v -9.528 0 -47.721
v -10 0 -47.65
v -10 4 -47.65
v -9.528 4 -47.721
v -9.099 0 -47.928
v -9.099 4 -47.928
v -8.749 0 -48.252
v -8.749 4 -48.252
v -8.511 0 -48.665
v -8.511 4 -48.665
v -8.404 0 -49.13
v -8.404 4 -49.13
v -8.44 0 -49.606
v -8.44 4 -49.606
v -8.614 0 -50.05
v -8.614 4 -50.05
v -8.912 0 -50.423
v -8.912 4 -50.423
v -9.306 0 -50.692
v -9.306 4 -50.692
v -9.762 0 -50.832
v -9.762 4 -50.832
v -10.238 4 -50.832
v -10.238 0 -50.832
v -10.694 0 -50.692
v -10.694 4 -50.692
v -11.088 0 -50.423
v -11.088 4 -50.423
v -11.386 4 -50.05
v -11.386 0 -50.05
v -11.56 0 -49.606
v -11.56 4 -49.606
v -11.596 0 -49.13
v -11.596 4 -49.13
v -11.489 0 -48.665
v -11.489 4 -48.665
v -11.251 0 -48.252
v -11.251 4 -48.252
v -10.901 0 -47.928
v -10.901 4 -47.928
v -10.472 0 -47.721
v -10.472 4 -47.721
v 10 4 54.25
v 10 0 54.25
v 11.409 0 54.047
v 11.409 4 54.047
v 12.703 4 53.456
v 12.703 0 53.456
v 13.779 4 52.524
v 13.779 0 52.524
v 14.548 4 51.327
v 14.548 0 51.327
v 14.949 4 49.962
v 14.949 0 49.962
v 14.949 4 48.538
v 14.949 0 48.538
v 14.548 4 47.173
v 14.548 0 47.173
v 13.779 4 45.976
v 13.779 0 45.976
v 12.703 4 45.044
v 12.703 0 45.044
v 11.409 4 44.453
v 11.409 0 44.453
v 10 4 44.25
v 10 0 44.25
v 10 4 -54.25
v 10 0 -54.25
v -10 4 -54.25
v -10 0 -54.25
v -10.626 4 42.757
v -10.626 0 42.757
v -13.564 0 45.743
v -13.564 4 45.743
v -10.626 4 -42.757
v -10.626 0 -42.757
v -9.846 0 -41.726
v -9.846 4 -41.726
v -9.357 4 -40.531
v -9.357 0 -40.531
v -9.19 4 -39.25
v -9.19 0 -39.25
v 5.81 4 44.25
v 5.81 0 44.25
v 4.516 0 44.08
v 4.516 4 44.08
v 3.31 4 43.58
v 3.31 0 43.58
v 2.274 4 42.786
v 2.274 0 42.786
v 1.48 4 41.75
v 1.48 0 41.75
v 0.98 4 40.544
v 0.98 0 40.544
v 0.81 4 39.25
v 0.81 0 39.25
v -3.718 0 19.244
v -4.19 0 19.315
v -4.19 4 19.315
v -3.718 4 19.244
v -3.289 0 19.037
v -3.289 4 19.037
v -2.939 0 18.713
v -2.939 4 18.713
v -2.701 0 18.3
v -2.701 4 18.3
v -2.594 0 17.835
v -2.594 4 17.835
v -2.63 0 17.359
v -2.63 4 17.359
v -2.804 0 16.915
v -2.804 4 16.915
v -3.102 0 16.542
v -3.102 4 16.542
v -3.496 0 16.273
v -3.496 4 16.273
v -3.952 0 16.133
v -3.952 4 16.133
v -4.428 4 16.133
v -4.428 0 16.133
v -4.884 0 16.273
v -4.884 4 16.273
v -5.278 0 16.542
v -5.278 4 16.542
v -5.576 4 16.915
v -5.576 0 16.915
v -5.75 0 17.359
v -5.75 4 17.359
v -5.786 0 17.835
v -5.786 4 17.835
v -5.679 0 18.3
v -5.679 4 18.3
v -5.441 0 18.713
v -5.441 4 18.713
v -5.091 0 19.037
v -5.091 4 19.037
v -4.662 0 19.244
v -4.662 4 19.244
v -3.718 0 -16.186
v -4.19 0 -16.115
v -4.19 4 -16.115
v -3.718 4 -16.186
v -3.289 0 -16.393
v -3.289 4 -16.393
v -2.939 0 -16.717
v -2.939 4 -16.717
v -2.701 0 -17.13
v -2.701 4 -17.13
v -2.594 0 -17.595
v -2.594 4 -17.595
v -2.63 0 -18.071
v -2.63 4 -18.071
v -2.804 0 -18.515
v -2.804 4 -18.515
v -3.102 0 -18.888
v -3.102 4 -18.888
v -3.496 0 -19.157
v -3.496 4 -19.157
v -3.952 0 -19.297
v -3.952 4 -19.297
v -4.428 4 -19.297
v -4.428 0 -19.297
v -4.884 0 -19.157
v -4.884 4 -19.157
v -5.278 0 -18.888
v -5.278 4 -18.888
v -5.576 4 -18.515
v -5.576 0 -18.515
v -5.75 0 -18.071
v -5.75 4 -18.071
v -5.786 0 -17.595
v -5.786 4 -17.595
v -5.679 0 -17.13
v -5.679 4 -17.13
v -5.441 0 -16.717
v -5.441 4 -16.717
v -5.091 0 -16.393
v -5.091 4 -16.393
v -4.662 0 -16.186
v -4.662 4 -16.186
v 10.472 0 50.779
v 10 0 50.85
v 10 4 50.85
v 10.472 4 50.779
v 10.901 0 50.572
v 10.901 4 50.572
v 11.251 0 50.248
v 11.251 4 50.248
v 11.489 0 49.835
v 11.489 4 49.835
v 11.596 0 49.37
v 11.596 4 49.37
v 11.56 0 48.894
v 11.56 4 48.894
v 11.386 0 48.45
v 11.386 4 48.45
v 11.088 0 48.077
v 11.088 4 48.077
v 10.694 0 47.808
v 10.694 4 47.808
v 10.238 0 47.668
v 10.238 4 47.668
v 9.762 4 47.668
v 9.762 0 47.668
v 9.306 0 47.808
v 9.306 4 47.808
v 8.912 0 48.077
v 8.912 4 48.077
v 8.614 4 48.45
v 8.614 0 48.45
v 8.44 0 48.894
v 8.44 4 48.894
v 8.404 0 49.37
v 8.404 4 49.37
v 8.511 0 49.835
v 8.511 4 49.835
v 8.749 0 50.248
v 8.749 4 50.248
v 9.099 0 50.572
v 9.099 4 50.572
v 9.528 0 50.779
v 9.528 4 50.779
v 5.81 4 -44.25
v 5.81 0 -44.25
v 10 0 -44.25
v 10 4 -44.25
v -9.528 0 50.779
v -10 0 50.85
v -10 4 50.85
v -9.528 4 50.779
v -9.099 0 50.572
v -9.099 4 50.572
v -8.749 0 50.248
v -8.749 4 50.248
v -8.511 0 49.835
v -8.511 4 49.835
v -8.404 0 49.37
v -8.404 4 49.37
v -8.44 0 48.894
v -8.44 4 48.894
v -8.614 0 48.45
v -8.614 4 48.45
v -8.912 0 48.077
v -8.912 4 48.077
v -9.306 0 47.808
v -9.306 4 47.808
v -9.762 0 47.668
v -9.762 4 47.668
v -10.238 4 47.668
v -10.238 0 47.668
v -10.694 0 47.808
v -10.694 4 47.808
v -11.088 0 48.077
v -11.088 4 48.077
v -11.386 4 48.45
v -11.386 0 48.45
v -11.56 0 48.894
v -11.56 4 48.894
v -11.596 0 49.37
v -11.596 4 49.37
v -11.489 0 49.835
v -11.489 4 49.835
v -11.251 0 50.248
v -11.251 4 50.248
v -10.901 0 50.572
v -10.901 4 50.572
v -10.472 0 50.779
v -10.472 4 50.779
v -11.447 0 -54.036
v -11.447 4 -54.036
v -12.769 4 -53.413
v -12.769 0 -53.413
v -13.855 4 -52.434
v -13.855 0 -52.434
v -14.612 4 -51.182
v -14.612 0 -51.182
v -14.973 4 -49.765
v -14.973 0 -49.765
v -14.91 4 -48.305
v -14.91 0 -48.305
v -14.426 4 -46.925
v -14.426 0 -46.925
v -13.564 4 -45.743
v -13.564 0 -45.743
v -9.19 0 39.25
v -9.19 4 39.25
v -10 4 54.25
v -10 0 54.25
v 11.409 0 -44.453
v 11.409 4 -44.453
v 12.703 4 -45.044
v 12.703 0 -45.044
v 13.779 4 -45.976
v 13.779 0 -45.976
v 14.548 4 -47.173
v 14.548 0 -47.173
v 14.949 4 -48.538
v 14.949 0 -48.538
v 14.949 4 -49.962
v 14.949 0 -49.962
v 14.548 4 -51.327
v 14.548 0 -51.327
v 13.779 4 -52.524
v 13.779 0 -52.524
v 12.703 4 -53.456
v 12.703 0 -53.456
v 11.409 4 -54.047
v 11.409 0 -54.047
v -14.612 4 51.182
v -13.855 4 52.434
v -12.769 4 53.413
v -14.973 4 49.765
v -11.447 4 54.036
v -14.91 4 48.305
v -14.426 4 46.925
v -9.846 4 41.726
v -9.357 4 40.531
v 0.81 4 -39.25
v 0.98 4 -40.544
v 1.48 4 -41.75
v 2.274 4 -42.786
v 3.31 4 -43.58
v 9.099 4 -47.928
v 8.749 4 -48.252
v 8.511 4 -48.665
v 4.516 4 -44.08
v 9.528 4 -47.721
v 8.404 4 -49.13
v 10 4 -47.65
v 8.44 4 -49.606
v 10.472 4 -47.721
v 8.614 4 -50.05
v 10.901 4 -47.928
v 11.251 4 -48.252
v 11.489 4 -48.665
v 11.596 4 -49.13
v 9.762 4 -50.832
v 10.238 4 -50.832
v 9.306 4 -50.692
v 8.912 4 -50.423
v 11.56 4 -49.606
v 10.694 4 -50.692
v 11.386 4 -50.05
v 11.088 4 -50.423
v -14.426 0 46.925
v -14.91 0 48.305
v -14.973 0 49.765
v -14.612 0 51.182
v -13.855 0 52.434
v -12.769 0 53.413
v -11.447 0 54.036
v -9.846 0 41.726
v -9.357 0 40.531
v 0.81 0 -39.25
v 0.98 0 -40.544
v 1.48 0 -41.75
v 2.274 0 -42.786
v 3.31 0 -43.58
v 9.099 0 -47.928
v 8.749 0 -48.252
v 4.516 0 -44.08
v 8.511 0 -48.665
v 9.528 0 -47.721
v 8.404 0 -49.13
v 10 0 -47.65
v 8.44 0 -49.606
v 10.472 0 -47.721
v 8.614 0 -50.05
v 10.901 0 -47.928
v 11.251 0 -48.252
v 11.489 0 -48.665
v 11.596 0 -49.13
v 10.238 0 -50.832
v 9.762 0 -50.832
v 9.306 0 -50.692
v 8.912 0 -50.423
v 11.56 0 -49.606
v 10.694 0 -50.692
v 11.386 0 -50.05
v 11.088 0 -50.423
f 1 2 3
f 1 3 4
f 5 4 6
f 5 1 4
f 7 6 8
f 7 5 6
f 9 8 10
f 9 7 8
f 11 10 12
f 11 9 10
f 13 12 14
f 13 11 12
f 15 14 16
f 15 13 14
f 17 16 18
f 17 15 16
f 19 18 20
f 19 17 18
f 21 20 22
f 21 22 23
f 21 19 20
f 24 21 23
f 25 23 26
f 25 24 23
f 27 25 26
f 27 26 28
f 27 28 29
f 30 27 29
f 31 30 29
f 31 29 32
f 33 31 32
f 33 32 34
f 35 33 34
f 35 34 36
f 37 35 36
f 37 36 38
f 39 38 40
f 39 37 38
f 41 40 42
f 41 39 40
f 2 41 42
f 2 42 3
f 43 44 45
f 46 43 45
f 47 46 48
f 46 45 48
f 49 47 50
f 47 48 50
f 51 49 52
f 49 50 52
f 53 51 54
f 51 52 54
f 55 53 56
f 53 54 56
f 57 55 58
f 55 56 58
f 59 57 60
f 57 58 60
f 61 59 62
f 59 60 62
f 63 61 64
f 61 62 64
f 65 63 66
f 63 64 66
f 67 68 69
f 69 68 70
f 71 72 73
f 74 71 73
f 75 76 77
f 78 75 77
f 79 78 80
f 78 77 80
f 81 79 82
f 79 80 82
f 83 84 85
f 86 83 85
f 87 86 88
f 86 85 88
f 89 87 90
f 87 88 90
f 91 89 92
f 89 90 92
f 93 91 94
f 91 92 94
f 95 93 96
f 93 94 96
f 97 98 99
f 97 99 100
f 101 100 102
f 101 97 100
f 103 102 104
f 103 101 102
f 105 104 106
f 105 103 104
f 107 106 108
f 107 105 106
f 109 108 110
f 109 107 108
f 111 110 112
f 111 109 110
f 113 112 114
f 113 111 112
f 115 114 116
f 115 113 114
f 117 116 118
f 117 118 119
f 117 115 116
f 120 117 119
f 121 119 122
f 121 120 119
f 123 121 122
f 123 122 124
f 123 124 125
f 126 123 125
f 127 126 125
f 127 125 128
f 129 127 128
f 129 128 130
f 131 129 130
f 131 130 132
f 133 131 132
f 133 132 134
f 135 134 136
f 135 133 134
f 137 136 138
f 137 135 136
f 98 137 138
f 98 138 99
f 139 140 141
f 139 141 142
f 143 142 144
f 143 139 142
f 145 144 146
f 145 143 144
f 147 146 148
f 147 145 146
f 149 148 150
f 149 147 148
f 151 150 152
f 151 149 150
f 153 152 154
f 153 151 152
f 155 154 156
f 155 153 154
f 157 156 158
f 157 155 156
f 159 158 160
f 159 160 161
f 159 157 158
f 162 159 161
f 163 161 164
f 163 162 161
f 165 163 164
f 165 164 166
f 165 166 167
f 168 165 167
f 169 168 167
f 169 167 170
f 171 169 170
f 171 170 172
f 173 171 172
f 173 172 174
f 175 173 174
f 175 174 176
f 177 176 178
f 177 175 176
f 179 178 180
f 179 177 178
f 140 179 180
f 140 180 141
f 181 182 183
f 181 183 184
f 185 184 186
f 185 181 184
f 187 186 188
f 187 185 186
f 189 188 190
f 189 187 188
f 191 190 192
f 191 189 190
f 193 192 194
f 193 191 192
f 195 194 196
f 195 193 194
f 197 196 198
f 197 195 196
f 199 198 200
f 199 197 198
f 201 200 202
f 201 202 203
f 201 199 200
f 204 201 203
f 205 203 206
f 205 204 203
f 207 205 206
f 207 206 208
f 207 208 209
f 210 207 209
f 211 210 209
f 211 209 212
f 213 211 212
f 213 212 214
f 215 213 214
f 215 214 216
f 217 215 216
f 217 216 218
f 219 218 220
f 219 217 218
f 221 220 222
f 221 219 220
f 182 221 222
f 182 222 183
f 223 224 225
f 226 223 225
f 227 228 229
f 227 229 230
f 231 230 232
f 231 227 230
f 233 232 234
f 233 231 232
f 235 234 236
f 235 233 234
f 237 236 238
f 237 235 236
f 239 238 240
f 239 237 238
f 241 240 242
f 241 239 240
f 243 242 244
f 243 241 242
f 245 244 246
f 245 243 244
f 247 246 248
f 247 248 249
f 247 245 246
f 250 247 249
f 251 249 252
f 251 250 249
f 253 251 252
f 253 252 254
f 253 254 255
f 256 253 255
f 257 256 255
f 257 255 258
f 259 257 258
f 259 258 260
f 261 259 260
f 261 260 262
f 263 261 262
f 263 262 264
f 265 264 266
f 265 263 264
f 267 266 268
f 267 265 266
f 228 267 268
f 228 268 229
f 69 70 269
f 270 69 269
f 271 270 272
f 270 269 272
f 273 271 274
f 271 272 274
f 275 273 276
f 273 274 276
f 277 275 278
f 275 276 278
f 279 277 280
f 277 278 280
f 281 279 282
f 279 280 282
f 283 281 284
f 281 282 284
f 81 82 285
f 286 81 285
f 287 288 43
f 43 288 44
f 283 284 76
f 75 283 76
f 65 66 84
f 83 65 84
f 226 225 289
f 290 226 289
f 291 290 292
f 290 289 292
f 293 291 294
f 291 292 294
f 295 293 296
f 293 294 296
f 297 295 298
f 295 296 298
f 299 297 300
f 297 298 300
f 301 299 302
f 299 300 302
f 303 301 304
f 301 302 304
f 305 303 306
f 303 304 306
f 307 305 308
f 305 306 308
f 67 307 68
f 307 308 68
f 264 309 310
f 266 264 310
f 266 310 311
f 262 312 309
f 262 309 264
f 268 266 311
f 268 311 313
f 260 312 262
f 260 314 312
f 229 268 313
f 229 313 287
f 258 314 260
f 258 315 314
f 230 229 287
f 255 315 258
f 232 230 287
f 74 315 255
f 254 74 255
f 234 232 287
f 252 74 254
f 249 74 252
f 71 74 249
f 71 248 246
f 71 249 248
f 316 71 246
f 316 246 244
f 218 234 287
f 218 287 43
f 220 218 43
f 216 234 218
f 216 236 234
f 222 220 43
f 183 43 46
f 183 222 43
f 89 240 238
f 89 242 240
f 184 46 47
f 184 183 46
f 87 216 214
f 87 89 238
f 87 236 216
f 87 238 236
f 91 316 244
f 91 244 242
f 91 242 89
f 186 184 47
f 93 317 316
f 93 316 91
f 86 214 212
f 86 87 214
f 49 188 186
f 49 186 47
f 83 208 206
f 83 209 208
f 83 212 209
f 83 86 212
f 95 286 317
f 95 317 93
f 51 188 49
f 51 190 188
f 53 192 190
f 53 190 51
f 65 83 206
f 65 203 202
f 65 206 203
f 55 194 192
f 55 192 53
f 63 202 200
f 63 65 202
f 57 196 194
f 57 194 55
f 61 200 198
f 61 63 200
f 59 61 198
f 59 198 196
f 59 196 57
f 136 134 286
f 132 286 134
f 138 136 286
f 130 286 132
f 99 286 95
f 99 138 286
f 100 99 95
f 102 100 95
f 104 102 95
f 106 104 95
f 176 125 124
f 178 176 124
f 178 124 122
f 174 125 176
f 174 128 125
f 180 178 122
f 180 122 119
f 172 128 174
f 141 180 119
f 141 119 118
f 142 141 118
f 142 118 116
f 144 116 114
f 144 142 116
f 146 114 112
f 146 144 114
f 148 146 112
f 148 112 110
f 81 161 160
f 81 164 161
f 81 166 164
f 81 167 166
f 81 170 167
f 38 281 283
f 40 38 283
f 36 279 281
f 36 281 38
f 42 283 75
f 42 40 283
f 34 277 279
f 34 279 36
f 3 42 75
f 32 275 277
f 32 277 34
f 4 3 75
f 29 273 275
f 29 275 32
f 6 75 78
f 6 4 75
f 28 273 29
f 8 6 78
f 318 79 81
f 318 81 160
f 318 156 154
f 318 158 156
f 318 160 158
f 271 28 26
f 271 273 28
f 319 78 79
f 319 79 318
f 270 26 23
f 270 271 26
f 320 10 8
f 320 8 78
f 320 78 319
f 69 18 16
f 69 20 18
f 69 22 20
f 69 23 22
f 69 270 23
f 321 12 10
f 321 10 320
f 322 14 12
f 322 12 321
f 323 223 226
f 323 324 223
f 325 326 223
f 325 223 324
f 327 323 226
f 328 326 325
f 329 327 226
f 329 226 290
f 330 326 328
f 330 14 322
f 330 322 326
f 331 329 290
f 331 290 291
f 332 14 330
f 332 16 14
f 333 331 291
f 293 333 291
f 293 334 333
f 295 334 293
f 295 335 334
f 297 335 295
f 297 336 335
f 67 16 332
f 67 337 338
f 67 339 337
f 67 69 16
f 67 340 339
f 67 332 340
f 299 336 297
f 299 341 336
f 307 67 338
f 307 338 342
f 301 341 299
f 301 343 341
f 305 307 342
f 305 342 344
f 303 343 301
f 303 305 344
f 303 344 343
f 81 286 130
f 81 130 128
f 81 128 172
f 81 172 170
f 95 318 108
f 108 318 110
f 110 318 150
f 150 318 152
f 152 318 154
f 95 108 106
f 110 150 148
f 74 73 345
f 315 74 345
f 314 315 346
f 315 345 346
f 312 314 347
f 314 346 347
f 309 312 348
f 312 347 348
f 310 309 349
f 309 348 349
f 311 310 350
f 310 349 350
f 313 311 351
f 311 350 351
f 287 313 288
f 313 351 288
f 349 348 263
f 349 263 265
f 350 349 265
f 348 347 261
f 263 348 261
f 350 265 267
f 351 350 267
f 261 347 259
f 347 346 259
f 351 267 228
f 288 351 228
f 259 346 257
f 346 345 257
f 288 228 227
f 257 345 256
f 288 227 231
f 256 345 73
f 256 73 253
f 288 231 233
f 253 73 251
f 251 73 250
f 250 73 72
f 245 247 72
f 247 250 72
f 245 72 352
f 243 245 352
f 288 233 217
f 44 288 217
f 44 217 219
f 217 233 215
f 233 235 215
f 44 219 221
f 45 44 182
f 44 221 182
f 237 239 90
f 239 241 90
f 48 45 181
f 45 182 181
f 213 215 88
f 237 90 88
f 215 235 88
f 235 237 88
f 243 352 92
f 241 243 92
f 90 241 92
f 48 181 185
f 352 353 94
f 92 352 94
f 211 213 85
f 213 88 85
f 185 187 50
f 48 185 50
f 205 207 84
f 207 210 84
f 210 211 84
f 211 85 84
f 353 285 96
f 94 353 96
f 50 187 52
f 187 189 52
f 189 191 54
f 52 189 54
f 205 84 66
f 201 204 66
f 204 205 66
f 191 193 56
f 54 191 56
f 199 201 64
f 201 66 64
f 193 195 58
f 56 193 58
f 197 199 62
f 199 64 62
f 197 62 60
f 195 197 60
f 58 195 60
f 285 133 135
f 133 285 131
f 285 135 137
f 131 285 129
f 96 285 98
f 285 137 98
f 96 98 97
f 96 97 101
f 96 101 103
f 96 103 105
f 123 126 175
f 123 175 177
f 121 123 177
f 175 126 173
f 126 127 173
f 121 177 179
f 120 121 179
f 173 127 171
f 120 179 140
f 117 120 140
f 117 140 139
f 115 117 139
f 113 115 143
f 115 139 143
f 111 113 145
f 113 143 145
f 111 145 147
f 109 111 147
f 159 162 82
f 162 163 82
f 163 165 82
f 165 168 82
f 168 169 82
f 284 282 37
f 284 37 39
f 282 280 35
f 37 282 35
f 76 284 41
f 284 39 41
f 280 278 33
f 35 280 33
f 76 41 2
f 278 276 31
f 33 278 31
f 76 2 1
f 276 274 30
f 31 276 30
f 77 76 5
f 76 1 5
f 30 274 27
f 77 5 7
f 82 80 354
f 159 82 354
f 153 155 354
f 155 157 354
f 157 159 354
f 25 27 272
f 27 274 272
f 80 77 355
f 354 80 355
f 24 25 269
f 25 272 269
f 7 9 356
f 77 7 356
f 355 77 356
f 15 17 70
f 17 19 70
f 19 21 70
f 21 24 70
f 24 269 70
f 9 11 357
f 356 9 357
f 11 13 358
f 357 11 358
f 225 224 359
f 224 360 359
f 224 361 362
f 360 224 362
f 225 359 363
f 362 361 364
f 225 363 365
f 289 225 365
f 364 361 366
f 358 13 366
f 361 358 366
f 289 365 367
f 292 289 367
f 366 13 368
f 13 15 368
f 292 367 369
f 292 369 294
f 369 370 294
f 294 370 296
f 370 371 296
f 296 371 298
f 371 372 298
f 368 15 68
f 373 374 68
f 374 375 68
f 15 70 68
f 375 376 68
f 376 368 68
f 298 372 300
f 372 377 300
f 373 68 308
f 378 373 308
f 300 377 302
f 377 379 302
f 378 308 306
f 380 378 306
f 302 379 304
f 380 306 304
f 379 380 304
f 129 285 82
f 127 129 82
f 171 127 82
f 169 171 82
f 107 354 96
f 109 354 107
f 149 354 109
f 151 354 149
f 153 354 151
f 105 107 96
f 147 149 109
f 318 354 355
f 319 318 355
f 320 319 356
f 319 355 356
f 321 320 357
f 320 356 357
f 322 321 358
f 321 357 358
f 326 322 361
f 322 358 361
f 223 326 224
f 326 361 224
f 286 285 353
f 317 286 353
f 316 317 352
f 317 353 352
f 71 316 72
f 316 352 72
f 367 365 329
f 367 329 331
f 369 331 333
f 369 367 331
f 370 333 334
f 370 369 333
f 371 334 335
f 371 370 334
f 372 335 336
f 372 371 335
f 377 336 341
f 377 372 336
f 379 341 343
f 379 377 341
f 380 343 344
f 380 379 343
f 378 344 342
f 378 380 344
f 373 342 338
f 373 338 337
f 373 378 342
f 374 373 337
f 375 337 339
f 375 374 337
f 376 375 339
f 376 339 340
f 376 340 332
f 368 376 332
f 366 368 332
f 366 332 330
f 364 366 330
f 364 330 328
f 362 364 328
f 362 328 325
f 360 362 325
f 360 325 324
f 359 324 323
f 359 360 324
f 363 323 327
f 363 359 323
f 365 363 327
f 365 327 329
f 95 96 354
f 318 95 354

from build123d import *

# Parameters (mm, degrees)
SKETCH1_R           = 1.6
BOSS_EXTRUDE1_DEPTH = 4


with BuildPart() as part:
    # Sketch1 → Boss-Extrude1 (new body)
    with BuildSketch(Plane(origin=(0, 0, 0), x_dir=(1, 0, 0), z_dir=(0, 1, 0))):
        with BuildLine():
            Line((10, 54.25), (-10, 54.25))
            ThreePointArc((-10, 54.25), (-14.611555285, 51.182241665), (-13.564255704, 45.74342314))
            Line((-13.564255704, 45.74342314), (-10.625744296, 42.75657686))
            ThreePointArc((-10.625744296, 42.75657686), (-9.562836802, 41.14456083), (-9.19, 39.25))
            Line((-9.19, 39.25), (-9.19, -39.25))
            ThreePointArc((-9.19, -39.25), (-9.562836802, -41.14456083), (-10.625744296, -42.75657686))
            Line((-10.625744296, -42.75657686), (-13.564255704, -45.74342314))
            ThreePointArc((-13.564255704, -45.74342314), (-14.611555285, -51.182241665), (-10, -54.25))
            Line((-10, -54.25), (10, -54.25))
            ThreePointArc((10, -54.25), (15, -49.25), (10, -44.25))
            Line((10, -44.25), (5.81, -44.25))
            ThreePointArc((5.81, -44.25), (2.274466094, -42.785533906), (0.81, -39.25))
            Line((0.81, -39.25), (0.81, 39.25))
            ThreePointArc((0.81, 39.25), (2.274466094, 42.785533906), (5.81, 44.25))
            Line((5.81, 44.25), (10, 44.25))
            ThreePointArc((10, 44.25), (15, 49.25), (10, 54.25))
        make_face()
        with Locations(Location((-10, 49.25, 0), (0, 0, 270))):
            Circle(SKETCH1_R, mode=Mode.SUBTRACT)
        with Locations(Location((10, 49.25, 0), (0, 0, 270))):
            Circle(SKETCH1_R, mode=Mode.SUBTRACT)
        with Locations(Location((-4.19, -17.715, 0), (0, 0, 270))):
            Circle(SKETCH1_R, mode=Mode.SUBTRACT)
        with Locations(Location((-4.19, 17.715, 0), (0, 0, 270))):
            Circle(SKETCH1_R, mode=Mode.SUBTRACT)
        with Locations(Location((10, -49.25, 0), (0, 0, 270))):
            Circle(SKETCH1_R, mode=Mode.SUBTRACT)
        with Locations(Location((-10, -49.25, 0), (0, 0, 270))):
            Circle(SKETCH1_R, mode=Mode.SUBTRACT)
    extrude(amount=BOSS_EXTRUDE1_DEPTH)


solid = part.part
